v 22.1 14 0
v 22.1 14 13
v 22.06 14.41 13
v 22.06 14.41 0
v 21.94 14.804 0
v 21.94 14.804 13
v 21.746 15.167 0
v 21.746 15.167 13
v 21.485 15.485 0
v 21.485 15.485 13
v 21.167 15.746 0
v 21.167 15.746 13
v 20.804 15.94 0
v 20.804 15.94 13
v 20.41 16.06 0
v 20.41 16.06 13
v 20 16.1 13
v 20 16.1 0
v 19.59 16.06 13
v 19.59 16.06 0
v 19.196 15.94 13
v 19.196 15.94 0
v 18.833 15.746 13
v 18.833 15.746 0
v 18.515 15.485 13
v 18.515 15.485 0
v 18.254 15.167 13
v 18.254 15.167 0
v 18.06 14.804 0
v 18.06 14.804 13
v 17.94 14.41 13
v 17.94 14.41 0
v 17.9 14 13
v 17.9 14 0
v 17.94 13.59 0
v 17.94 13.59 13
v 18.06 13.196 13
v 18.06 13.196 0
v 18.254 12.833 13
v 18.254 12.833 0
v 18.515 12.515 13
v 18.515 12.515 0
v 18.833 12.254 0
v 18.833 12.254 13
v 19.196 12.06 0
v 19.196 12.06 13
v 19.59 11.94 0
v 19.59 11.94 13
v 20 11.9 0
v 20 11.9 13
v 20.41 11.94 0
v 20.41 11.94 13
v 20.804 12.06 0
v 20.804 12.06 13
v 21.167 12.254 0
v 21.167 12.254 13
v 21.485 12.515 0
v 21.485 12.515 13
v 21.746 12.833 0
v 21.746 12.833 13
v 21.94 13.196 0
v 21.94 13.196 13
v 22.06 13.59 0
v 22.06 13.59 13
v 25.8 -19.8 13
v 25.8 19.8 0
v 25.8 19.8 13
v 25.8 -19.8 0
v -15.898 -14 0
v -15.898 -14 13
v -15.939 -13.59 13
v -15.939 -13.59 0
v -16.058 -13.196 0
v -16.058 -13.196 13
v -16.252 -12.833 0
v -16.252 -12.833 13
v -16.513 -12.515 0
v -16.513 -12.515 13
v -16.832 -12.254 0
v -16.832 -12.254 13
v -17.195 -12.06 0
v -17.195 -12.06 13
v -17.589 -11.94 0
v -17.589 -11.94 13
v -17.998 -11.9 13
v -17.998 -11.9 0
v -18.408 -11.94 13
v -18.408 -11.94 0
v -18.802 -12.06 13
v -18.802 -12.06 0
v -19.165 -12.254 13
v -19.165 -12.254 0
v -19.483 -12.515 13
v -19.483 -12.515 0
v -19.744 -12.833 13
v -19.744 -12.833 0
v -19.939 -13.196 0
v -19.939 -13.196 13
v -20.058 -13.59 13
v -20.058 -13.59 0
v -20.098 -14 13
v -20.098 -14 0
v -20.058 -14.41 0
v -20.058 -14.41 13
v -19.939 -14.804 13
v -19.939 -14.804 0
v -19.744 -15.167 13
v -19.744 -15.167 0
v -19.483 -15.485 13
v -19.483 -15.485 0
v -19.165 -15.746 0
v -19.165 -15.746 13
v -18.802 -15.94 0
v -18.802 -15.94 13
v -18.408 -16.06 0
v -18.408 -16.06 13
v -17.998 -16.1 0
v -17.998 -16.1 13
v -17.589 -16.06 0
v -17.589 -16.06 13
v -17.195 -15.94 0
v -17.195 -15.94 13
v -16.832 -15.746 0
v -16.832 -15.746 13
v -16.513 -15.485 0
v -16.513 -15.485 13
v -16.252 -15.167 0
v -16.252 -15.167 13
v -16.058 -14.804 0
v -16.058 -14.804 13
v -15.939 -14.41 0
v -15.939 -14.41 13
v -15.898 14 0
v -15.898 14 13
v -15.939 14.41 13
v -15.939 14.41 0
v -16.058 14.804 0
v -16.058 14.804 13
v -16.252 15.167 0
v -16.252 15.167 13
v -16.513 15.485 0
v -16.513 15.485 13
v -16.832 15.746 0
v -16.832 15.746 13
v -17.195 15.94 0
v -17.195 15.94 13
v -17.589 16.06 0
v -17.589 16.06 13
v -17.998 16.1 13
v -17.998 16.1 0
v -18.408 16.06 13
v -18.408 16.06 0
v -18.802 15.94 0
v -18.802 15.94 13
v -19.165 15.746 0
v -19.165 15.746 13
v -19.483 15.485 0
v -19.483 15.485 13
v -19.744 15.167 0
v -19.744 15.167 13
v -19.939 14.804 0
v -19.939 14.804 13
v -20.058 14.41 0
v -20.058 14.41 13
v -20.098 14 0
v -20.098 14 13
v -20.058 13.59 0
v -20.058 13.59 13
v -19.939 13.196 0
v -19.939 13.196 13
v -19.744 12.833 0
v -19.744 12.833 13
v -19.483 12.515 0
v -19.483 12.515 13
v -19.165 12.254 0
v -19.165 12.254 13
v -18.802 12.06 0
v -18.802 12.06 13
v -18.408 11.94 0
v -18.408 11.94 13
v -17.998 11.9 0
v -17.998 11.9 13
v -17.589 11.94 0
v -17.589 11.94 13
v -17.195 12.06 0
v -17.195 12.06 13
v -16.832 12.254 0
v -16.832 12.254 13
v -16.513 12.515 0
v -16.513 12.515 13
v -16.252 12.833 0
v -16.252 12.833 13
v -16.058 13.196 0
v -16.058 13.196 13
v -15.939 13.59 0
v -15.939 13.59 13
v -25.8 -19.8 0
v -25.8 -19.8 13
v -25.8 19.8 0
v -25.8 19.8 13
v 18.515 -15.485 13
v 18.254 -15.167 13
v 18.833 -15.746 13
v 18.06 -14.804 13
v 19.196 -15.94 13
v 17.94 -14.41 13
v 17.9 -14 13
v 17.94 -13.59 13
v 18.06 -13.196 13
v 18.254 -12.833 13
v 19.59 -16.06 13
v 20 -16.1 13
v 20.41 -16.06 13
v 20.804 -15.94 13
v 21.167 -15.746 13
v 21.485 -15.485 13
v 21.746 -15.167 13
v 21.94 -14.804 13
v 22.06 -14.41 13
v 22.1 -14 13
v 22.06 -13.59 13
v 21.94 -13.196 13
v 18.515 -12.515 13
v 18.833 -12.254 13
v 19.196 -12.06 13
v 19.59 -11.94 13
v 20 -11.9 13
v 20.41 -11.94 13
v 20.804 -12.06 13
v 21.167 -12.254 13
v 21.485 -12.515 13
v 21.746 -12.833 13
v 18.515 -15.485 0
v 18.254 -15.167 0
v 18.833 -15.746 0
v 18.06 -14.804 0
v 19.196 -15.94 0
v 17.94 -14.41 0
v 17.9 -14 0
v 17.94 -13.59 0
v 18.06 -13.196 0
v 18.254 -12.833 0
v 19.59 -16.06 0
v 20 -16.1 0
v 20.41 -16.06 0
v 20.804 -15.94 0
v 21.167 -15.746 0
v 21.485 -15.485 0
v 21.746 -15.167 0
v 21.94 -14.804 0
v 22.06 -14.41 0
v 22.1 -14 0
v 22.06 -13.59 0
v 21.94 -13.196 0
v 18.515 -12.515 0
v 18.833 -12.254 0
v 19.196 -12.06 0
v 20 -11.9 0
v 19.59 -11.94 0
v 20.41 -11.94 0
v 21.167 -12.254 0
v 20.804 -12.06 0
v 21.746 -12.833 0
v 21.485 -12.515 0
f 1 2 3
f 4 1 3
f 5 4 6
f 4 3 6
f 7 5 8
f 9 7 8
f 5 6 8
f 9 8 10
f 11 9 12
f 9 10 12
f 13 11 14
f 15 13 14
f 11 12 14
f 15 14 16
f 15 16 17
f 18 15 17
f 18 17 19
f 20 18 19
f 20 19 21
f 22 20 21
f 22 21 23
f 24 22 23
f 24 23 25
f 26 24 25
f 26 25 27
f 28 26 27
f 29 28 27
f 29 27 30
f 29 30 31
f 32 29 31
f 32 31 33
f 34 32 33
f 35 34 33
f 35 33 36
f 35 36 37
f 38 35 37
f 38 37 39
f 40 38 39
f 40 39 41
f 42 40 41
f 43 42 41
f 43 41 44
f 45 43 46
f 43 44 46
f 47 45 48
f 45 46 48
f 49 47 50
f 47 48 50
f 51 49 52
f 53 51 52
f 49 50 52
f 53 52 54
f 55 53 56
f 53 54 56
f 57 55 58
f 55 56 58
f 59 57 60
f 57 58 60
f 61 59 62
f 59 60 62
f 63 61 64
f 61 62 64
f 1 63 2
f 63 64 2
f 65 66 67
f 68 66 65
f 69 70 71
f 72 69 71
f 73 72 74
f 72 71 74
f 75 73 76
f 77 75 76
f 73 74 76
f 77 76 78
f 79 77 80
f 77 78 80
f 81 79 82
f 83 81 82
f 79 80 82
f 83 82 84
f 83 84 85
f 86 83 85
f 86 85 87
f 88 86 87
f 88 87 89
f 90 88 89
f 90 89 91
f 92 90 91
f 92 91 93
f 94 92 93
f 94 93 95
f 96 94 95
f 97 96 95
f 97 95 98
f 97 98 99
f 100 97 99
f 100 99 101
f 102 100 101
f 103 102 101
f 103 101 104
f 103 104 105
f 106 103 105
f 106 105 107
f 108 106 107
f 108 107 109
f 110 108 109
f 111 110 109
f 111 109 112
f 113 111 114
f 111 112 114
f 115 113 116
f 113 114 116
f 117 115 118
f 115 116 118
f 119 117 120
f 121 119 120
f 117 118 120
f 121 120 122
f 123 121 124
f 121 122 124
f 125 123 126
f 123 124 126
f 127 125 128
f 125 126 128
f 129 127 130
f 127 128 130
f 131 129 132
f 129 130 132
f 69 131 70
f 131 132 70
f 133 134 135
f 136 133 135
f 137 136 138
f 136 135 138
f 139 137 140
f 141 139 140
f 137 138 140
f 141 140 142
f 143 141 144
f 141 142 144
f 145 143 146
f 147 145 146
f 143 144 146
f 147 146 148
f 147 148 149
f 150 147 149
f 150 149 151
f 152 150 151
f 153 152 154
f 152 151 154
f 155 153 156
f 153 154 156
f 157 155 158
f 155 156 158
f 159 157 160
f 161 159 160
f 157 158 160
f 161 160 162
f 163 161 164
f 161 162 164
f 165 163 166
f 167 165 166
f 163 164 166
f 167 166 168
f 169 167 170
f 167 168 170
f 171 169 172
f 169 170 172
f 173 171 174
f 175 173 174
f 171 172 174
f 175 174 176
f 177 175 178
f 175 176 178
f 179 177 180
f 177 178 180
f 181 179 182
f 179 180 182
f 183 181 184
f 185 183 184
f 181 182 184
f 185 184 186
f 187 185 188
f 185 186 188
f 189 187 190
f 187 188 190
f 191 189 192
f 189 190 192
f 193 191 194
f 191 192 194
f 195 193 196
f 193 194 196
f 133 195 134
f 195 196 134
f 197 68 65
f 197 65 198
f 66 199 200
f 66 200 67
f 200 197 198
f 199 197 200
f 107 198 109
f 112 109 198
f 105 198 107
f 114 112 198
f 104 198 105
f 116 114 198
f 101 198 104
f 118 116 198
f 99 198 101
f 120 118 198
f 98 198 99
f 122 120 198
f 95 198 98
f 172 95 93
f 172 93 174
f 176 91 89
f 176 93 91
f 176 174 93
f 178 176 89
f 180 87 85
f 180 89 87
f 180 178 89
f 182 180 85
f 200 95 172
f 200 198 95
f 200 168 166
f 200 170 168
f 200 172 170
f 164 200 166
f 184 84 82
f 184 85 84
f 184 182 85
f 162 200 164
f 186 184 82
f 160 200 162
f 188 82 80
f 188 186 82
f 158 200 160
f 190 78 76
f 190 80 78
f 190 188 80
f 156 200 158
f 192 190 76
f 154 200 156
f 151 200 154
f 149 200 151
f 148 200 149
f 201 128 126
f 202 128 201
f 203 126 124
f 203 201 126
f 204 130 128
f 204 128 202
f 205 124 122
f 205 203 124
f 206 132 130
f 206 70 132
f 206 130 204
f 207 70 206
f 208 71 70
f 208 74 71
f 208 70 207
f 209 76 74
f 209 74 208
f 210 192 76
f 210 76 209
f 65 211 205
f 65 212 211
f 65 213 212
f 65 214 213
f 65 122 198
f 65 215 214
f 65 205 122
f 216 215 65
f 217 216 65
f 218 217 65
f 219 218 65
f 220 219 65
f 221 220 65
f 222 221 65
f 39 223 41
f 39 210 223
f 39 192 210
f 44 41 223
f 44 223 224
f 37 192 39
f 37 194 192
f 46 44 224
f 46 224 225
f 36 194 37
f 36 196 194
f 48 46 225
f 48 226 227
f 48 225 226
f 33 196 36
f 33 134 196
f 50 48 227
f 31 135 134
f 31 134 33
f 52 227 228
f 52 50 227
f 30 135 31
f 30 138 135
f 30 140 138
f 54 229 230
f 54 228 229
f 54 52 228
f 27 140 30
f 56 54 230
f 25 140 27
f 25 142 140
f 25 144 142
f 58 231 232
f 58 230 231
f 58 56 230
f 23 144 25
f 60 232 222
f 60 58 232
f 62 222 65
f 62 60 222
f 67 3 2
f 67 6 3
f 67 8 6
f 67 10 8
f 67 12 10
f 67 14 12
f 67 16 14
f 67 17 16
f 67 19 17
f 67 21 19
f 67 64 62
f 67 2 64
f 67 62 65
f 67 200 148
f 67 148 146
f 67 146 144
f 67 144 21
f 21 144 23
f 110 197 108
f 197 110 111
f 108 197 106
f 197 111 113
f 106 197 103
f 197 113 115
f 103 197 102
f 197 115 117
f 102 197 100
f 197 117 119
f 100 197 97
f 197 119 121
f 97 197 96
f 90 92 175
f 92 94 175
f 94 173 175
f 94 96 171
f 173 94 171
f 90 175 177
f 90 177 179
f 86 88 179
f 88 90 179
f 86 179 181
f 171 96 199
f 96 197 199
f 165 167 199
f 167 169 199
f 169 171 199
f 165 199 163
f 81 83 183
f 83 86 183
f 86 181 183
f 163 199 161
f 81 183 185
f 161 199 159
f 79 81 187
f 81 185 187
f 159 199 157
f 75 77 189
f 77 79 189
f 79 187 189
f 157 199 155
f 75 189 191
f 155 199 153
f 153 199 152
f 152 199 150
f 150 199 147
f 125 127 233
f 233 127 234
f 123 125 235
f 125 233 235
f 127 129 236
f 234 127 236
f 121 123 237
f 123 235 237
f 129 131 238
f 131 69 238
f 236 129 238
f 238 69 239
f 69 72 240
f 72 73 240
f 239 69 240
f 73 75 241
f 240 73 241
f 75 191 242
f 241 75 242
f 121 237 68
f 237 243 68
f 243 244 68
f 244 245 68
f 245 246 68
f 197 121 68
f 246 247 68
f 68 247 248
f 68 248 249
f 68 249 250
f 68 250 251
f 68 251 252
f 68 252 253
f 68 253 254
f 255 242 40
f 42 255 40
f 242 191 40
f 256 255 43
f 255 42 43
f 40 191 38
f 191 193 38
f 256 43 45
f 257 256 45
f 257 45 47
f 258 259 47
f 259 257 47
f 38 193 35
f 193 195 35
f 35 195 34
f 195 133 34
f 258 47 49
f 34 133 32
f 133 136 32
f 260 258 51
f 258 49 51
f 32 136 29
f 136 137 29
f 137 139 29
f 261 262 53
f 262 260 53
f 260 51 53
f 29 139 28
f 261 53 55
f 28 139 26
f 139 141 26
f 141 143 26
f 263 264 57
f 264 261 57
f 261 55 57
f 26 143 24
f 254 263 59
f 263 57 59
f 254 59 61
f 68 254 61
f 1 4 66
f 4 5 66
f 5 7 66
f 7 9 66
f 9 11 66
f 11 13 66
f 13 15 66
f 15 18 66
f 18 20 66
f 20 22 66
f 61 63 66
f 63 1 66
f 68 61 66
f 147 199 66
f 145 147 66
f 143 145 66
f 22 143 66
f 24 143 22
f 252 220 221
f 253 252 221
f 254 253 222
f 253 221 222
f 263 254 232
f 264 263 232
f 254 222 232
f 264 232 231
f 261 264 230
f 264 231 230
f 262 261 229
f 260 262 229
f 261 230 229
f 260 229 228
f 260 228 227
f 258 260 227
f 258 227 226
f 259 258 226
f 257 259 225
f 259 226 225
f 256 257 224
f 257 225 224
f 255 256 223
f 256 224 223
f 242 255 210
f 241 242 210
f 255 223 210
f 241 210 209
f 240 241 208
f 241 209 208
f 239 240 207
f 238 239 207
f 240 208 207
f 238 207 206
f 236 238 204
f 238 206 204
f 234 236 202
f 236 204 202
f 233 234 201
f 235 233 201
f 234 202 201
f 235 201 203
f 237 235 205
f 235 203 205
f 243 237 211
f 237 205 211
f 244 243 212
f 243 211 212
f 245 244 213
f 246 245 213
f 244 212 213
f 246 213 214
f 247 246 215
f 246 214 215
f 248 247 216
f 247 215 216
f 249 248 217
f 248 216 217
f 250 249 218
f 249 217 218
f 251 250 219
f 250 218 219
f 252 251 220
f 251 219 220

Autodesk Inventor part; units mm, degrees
ref_plane "YZ Plane" through (0, 0, 0) normal (1, 0, 0) x (0, 1, 0)
ref_plane "XZ Plane" through (0, 0, 0) normal (0, 1, 0) x (-1, 0, 0)
ref_plane "XY Plane" through (0, 0, 0) normal (0, 0, 1) x (1, 0, 0)
sketch "Boceto1" plane through (0, 0, 0) normal (0, 0, 1) x (1, 0, 0)
  line L0 (-25.8, 19.8) -> (25.8, 19.8)
  line L1 (25.8, 19.8) -> (25.8, -19.8)
  line L2 (25.8, -19.8) -> (-25.8, -19.8)
  line L3 (-25.8, -19.8) -> (-25.8, 19.8)
  line L4 (-25.8, 19.8) -> (25.8, -19.8) construction
  line L5 (25.8, 19.8) -> (-25.8, -19.8) construction
  point P0 (0, 0)
  dimension "d0" = 39.6
  dimension "d1" = 51.6
extrude "Extrusión1" add sketch "Boceto1" along normal blind 13
sketch "Boceto2" plane through (0, 0, 13) normal (0, 0, 1) x (1, 0, 0)
  circle A0 centre (-17.9984, 14) radius 2.1
  circle A1 centre (20, 14) radius 2.1
  line L0 (25.8, -19.8) -> (25.8, 19.8) projected
  line L1 (25.8, 19.8) -> (-25.8, 19.8) projected
  line L2 (-25.8, 19.8) -> (-25.8, -19.8) projected
  line L3 (20, 14) -> (-25.8, 14) construction
  line L4 (-25.8, 0) -> (25.8, 0) construction
  circle A2 centre (-17.9984, -14) radius 2.1
  circle A3 centre (20, -14) radius 2.1
  point P0 (0, 0)
  dimension "d4" = 4.2
  dimension "d5" = 4.2
  dimension "d7" = 5.8
  dimension "d8" = 5.8
  dimension "d10" = 5.8
  dimension "d11" = 7.8016
extrude "Extrusión2" cut sketch "Boceto2" against normal through all
properties part number "PiezaNivel" material "Plástico ABS"
